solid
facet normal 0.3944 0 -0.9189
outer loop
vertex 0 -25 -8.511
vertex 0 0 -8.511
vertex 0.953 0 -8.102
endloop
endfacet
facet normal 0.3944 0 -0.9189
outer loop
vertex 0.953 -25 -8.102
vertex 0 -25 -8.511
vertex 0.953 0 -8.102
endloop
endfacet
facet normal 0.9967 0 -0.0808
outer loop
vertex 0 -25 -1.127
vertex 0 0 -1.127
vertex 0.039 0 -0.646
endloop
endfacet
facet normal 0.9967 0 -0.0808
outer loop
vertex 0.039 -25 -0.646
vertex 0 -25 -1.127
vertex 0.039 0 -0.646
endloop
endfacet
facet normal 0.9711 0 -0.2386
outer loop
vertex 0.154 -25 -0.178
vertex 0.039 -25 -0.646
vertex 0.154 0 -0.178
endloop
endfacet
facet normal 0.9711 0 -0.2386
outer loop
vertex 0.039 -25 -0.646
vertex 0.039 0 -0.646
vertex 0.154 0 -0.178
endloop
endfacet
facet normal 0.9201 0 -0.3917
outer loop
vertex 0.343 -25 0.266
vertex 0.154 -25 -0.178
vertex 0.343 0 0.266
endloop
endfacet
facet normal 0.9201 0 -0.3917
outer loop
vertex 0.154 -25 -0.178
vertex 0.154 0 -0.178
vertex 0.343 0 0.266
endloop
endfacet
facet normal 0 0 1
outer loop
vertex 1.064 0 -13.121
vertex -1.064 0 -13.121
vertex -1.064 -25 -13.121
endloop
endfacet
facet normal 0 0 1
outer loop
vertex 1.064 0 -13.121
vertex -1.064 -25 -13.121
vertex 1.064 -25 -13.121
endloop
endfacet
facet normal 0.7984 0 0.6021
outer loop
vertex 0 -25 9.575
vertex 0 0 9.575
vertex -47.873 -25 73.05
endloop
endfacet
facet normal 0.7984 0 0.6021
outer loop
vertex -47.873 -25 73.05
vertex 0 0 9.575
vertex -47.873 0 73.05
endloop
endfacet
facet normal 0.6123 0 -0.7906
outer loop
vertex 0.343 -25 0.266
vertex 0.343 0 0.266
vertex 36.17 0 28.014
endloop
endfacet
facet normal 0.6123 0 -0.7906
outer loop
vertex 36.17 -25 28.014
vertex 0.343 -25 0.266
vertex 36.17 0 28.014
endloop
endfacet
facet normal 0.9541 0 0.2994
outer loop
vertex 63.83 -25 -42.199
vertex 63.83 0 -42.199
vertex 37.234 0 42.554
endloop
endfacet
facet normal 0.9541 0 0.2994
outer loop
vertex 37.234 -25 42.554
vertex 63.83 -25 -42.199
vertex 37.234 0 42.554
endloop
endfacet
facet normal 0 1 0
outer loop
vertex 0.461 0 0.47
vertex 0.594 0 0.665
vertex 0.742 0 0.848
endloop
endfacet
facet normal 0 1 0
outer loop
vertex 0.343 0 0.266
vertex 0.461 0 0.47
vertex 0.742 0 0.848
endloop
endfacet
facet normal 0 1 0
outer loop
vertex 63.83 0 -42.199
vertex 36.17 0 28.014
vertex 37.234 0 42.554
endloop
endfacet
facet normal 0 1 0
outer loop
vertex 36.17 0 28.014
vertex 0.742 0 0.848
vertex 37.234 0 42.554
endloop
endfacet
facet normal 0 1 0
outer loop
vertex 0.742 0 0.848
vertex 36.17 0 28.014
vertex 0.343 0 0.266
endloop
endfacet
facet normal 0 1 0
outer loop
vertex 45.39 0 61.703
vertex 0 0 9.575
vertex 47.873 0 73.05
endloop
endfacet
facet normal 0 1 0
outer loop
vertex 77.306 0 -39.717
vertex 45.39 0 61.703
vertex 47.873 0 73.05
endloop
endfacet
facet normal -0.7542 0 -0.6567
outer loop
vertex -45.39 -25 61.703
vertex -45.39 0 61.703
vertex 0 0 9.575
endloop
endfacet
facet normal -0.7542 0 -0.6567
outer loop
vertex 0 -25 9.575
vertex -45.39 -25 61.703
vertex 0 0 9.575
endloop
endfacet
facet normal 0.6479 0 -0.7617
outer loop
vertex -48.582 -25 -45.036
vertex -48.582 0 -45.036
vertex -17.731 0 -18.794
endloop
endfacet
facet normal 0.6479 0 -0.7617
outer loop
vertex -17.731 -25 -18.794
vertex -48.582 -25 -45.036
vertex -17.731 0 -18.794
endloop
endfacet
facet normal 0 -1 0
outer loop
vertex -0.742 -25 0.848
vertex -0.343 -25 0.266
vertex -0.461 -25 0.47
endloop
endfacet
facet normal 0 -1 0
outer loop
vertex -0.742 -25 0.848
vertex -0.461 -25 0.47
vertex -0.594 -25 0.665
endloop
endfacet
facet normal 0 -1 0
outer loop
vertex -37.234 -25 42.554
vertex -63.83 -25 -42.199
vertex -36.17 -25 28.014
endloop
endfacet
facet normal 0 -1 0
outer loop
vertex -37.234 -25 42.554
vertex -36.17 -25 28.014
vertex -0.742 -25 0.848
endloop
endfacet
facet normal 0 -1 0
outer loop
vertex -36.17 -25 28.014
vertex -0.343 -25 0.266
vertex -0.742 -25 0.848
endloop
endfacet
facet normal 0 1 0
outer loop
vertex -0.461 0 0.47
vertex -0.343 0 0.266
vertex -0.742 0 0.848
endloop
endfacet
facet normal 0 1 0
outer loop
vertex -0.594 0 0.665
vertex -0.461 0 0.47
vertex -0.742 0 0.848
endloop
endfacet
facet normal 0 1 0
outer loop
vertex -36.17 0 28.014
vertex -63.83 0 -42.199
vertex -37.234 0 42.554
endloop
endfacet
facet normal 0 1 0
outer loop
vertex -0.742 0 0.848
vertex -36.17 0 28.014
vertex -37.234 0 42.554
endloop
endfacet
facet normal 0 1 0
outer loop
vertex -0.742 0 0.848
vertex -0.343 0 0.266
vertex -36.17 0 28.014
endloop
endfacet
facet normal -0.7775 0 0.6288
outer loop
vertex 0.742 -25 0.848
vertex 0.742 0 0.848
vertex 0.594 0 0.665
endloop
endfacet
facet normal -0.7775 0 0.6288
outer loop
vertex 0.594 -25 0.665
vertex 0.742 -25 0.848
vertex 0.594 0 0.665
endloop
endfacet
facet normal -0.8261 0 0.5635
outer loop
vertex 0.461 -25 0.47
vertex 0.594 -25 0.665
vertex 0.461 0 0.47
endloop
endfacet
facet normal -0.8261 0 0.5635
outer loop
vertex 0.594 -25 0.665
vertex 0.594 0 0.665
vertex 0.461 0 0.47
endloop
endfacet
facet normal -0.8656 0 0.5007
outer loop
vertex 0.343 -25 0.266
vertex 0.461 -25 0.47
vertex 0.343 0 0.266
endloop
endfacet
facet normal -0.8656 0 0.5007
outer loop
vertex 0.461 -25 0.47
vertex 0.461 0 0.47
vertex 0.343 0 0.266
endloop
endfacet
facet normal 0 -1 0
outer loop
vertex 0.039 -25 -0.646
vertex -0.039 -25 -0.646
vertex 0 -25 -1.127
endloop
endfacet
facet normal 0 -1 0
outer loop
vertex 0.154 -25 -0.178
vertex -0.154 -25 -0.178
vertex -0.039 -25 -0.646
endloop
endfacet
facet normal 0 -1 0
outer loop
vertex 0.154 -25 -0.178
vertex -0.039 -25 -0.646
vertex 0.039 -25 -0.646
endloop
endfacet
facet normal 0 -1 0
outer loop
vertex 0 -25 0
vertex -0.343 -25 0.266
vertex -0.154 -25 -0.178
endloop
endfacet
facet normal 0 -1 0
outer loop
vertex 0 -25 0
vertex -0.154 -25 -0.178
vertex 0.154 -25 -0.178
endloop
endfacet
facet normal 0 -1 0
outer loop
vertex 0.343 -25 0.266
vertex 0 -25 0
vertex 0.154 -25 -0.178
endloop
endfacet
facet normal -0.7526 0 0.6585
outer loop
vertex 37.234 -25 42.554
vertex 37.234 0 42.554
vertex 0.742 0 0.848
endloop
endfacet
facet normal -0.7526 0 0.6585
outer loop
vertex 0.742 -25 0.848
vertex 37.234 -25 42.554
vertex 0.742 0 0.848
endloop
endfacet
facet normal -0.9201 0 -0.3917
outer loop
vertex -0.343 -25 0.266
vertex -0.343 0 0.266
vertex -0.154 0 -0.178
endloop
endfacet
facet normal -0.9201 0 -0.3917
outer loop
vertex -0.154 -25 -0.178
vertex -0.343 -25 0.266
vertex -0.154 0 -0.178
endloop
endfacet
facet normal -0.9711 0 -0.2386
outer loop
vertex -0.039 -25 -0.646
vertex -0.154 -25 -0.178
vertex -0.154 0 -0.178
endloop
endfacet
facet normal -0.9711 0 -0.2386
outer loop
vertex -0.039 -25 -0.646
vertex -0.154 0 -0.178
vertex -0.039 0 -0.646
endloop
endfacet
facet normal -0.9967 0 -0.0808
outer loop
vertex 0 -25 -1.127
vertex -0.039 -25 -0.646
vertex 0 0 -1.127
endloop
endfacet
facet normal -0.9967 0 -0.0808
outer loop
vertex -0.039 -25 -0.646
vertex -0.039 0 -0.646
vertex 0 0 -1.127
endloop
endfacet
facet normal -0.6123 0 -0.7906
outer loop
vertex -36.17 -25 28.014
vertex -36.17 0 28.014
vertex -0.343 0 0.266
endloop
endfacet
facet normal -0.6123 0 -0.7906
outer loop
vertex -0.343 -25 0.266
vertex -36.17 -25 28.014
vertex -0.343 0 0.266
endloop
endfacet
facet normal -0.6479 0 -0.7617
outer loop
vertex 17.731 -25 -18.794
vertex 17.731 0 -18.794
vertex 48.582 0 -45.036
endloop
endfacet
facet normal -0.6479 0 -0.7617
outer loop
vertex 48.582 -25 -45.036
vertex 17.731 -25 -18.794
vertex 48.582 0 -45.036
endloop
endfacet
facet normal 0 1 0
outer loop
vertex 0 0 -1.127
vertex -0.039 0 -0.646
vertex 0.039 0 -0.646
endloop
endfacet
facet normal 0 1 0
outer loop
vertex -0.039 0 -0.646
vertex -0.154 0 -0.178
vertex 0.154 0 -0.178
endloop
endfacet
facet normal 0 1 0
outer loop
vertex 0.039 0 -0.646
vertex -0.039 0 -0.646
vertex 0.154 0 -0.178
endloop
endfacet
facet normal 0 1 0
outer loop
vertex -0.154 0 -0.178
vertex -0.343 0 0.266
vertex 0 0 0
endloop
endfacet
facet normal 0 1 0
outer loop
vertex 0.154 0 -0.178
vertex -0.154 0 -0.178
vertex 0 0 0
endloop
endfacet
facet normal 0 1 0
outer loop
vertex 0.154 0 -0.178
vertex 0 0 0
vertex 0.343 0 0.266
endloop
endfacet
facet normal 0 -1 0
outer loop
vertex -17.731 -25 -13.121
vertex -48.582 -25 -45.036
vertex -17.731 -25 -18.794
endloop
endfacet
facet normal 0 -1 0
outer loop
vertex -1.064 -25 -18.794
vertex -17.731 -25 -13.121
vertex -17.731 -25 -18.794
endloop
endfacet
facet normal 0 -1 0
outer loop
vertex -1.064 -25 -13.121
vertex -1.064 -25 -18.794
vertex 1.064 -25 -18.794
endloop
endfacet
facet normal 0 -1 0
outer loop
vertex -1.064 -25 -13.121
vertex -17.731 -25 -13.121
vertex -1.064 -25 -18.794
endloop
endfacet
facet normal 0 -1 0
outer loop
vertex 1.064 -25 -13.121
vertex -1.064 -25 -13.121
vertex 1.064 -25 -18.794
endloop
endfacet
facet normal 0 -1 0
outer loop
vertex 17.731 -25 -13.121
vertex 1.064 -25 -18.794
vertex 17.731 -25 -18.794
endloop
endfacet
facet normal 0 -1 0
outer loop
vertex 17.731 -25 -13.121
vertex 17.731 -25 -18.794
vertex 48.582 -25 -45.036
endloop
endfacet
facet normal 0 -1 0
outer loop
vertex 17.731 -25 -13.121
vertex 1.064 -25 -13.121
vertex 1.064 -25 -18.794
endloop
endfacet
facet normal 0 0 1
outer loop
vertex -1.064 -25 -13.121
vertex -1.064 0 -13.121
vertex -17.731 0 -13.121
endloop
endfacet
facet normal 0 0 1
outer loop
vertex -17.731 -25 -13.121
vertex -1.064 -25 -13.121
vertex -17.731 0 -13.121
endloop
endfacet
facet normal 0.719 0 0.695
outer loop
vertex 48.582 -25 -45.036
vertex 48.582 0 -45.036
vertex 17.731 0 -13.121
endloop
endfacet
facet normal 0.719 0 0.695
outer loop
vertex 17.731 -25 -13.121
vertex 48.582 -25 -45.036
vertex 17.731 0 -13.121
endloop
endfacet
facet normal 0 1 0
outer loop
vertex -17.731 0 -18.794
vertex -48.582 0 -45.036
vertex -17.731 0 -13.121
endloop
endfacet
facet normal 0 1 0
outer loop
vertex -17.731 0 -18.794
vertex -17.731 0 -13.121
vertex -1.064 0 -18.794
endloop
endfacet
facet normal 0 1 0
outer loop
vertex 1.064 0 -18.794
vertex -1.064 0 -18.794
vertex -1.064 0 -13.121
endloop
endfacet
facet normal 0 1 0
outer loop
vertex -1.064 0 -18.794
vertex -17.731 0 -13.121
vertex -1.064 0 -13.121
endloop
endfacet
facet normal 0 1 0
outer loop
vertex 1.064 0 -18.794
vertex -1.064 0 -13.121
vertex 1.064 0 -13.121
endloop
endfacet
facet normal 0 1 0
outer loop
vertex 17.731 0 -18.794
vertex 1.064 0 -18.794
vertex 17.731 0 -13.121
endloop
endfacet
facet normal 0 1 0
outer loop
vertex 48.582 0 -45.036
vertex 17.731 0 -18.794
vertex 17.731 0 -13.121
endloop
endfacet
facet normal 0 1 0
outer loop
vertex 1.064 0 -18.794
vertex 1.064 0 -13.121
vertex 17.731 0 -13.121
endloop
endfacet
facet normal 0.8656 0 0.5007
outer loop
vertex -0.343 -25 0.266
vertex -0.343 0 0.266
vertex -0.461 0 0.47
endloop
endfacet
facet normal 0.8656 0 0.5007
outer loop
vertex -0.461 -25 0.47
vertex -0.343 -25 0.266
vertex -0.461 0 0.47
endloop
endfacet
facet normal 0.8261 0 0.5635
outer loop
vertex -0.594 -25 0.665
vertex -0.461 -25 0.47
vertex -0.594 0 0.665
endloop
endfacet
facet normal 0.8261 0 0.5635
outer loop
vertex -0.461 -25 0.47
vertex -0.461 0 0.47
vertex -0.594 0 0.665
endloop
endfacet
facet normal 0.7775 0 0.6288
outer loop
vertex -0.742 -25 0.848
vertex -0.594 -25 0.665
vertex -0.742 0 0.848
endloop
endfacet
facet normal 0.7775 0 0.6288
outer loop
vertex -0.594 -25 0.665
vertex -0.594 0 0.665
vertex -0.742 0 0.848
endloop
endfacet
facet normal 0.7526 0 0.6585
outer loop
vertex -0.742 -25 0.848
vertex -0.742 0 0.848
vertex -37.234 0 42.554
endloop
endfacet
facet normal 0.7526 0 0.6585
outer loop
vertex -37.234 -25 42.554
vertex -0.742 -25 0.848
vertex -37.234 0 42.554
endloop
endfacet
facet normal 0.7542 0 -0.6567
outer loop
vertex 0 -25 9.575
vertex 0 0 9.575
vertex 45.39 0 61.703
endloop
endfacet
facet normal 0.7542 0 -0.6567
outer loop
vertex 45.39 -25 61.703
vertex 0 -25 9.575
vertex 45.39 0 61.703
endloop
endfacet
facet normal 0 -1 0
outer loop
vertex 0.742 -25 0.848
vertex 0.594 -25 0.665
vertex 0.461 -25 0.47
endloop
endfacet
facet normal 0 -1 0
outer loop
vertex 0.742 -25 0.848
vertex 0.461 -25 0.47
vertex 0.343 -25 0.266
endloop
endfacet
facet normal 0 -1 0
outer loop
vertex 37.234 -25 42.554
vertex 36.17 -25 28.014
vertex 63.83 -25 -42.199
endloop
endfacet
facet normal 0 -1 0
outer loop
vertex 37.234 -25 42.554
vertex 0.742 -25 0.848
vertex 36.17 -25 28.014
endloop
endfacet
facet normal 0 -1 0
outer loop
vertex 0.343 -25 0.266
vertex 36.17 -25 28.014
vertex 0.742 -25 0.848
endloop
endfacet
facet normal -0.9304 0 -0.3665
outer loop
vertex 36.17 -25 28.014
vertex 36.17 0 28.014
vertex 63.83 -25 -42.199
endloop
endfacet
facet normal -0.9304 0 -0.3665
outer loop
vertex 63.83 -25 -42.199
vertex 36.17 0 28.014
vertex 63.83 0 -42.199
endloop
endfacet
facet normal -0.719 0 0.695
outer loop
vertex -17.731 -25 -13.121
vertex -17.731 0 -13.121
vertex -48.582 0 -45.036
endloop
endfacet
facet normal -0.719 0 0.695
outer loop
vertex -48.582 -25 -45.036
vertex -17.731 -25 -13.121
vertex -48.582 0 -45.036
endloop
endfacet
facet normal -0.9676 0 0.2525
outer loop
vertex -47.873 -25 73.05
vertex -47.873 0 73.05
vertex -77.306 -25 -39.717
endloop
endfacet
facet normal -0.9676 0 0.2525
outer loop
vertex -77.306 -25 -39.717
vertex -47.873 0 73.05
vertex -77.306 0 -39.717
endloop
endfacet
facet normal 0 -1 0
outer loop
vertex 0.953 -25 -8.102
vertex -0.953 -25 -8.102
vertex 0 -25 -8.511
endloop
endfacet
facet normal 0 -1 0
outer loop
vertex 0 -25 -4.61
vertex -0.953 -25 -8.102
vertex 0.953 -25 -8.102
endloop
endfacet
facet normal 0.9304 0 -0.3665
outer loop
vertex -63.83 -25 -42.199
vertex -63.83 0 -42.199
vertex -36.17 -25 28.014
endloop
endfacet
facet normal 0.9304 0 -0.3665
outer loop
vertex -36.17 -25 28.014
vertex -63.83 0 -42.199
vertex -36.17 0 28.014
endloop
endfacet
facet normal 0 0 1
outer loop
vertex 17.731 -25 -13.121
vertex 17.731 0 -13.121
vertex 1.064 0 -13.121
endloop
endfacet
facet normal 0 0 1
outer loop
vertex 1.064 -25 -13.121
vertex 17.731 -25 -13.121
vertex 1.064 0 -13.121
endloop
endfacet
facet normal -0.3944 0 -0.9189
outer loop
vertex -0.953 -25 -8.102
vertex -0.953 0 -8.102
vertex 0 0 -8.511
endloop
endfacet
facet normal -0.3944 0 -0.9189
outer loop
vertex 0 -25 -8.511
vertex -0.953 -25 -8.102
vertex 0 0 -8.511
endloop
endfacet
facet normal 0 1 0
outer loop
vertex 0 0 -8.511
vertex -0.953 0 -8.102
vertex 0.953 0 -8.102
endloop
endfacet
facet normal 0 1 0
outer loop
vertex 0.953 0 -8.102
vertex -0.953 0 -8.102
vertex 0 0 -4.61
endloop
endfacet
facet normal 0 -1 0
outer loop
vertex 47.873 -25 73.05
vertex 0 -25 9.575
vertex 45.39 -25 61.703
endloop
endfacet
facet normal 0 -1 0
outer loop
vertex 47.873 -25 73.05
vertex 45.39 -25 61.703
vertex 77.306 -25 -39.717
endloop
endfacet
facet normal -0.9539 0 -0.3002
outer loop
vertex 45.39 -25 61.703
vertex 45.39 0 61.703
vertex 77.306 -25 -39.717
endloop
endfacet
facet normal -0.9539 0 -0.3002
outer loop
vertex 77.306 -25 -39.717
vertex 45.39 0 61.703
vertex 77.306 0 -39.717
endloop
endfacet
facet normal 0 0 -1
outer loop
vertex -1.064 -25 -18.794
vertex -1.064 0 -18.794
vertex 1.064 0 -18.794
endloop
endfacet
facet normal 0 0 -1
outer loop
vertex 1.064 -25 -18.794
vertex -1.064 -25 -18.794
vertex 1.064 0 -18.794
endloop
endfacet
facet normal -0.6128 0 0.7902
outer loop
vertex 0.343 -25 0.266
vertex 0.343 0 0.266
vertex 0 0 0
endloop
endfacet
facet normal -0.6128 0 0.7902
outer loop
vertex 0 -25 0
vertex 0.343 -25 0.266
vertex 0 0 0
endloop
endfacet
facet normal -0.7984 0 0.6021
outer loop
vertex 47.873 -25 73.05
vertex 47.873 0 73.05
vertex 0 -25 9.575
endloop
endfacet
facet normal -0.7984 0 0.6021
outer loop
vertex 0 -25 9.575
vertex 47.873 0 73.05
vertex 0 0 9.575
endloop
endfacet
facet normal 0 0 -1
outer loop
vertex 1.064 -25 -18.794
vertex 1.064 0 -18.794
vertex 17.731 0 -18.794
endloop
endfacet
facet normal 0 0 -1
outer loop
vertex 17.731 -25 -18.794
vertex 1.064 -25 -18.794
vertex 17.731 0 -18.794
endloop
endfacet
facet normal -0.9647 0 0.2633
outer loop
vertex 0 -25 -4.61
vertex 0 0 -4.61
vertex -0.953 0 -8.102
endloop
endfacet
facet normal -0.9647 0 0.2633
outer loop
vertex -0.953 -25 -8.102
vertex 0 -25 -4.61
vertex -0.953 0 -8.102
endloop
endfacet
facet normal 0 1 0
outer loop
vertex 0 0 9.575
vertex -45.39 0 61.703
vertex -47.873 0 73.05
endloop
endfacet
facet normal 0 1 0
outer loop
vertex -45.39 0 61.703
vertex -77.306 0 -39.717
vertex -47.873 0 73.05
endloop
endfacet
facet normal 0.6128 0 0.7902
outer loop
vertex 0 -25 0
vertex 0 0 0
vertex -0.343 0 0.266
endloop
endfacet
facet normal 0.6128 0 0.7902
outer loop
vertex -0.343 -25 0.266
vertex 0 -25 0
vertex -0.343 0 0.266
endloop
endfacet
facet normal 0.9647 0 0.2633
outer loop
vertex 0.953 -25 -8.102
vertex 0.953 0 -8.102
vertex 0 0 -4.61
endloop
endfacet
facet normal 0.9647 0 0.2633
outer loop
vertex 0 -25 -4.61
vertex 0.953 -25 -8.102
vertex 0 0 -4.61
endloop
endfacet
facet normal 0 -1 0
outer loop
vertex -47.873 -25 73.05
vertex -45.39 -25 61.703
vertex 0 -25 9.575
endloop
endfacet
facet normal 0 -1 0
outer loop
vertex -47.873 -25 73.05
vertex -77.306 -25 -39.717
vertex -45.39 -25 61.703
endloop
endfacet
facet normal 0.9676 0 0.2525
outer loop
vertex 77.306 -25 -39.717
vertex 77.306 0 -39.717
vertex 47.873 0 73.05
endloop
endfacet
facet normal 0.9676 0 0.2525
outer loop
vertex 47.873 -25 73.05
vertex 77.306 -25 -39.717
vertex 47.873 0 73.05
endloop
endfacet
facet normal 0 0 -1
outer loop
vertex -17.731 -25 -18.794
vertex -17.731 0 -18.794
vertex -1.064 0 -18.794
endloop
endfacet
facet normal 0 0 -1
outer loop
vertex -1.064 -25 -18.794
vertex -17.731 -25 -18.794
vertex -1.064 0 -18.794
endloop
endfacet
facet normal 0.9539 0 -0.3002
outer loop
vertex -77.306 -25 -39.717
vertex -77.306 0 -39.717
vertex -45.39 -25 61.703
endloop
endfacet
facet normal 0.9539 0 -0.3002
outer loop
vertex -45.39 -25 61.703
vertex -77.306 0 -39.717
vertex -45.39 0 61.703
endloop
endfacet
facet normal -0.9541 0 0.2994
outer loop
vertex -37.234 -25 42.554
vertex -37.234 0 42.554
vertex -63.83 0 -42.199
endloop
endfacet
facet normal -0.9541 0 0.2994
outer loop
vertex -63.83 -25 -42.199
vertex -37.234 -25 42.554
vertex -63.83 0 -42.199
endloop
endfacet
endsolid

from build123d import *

# Parameters (mm, degrees)
F0_W     = 2.127678
F0_H     = 5.673803
F1_DEPTH = 25


with BuildPart() as f1:
    # F0 (on Front) → F1 (new body)
    with BuildSketch(Plane.XZ):
        with BuildLine():
            ThreePointArc((-0.342909, 0.265587), (-0.525377, 0.568744), (-0.74227, 0.848308))
            Line((-0.74227, 0.848308), (-37.234329, 42.553518))
            Line((-37.234329, 42.553518), (-63.830279, -42.198904))
            Line((-63.830279, -42.198904), (-36.17049, 28.014401))
            Line((-36.17049, 28.014401), (-0.342909, 0.265587))
        make_face()
        with BuildLine():
            ThreePointArc((0.74227, 0.848308), (0.525377, 0.568744), (0.342909, 0.265587))
            Line((0.342909, 0.265587), (36.17049, 28.014401))
            Line((36.17049, 28.014401), (63.830279, -42.198904))
            Line((63.830279, -42.198904), (37.234329, 42.553518))
            Line((37.234329, 42.553518), (0.74227, 0.848308))
        make_face()
        with BuildLine():
            Line((0, 0), (-0.342909, 0.265587))
            ThreePointArc((-0.342909, 0.265587), (-0.086989, -0.410013), (0, -1.127205))
            Line((0, -1.127205), (0, 0))
        make_face()
        with BuildLine():
            Line((0.342909, 0.265587), (0, 0))
            Line((0, 0), (0, -1.127205))
            ThreePointArc((0, -1.127205), (0.086989, -0.410013), (0.342909, 0.265587))
        make_face()
        Polygon((0, -4.609964), (-0.952507, -8.102487), (0, -8.510704), (0.952507, -8.102487), align=None)
        with Locations((0, -15.957569)):
            Rectangle(F0_W, F0_H)
        Polygon((17.730633, -13.120668), (1.063839, -13.120668), (1.063839, -18.794471), (17.730633, -18.794471), (48.581935, -45.035809), align=None)
        Polygon((-1.063839, -18.794471), (-1.063839, -13.120668), (-17.730633, -13.120668), (-48.581935, -45.035809), (-17.730633, -18.794471), align=None)
        Polygon((-45.39042, 61.702605), (0, 9.574542), (-47.872711, 73.050208), (-77.305563, -39.71662), align=None)
        Polygon((47.872711, 73.050208), (0, 9.574542), (45.39042, 61.702605), (77.305563, -39.71662), align=None)
    extrude(amount=F1_DEPTH)


solid = f1.part
